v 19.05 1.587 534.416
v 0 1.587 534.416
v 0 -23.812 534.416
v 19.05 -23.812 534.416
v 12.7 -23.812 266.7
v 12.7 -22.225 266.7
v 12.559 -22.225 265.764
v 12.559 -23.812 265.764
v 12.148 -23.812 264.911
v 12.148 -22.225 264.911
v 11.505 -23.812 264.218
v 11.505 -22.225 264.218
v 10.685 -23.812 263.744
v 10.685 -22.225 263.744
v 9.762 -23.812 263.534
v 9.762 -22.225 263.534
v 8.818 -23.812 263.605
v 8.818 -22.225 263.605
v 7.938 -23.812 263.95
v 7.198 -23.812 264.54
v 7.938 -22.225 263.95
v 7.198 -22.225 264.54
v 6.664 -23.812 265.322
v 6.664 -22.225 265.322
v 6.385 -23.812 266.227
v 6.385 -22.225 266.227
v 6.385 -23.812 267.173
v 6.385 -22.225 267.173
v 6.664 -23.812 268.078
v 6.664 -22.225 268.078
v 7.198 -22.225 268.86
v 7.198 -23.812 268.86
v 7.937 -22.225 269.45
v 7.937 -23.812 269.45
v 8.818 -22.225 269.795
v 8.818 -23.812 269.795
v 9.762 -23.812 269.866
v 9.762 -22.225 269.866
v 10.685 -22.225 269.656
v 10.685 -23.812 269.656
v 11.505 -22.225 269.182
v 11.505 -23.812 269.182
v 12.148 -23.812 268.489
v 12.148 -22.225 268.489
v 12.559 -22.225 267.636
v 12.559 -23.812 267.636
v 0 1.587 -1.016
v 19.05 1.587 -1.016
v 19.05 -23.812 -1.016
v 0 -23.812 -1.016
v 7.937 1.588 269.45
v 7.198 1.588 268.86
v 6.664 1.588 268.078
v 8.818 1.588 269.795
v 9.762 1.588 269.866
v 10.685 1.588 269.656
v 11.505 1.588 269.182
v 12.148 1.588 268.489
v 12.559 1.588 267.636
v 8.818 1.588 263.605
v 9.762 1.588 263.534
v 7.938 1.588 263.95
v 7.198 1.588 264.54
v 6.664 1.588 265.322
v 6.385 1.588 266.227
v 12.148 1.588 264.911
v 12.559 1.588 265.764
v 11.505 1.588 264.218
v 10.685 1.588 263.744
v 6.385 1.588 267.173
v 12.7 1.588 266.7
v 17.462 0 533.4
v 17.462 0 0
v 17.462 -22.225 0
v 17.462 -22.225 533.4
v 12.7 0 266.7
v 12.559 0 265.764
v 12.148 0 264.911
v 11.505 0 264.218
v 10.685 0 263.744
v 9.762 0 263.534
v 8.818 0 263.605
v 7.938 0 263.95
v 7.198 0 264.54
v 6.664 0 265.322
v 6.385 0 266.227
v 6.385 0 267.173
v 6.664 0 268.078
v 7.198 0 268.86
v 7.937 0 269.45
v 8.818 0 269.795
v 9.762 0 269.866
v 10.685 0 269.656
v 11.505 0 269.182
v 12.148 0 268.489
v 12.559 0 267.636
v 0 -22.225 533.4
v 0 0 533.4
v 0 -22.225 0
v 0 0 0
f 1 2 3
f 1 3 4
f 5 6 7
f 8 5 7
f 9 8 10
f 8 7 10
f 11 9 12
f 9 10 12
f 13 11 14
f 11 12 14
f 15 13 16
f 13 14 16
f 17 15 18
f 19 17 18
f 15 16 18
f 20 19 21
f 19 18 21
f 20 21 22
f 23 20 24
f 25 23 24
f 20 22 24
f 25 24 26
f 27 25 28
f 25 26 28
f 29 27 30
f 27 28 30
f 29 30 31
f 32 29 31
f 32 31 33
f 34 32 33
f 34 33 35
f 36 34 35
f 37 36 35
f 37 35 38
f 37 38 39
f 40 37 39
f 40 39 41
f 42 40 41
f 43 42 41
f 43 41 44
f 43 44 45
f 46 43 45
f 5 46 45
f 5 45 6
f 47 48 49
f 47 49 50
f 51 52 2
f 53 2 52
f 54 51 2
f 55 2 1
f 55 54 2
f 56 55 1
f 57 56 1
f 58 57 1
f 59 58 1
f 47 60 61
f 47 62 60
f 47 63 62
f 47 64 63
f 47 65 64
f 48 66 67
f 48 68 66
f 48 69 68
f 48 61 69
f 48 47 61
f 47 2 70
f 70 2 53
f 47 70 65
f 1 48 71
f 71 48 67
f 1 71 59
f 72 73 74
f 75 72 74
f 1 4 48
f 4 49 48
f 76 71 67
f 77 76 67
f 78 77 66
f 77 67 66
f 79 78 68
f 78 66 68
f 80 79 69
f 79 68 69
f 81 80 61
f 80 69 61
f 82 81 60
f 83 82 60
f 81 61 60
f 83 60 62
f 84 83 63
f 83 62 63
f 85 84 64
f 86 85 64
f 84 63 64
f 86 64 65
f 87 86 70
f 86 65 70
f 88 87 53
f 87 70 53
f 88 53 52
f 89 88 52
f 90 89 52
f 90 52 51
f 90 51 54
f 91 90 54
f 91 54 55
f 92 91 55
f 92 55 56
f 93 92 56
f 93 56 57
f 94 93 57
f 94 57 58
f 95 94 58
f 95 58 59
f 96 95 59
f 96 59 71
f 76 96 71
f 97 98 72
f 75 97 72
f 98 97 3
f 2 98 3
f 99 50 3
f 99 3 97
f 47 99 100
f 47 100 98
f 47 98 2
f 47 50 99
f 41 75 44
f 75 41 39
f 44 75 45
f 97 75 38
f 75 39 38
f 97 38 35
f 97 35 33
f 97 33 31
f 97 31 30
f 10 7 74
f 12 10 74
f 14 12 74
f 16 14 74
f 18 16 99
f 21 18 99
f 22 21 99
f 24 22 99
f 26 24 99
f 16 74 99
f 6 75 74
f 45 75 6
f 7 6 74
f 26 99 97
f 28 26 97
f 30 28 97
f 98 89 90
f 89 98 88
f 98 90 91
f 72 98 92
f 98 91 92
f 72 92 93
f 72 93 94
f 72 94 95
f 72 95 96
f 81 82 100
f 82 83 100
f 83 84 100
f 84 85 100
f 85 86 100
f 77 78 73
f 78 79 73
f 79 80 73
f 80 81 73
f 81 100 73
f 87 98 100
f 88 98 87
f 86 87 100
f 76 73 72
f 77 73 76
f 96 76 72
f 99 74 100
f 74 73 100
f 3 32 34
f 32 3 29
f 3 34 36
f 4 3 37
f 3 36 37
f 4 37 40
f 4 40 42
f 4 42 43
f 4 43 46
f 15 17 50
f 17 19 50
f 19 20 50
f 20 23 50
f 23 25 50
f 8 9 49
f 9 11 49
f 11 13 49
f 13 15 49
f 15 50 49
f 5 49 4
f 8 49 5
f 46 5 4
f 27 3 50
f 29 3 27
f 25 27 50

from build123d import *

# Parameters (mm, degrees)
BOSS_EXTRUDE1_DEPTH = 533.4
SKETCH2_R           = 3.175
CUT_EXTRUDE1_DEPTH  = 381
SKETCH4_W           = 19.05
SKETCH4_H           = 25.4
BOSS_EXTRUDE3_DEPTH = 1.016
SKETCH5_W           = 19.05
SKETCH5_H           = 25.4
BOSS_EXTRUDE4_DEPTH = 1.016


with BuildPart() as part:
    # Sketch1 → Boss-Extrude1 (new body)
    with BuildSketch(Plane.XY):
        Polygon((0, 0), (17.4625, 0), (17.4625, -22.225), (0, -22.225), (0, -23.8125), (12.7, -23.8125), (19.05, -23.8125), (19.05, 0), (19.05, 1.5875), (0, 1.5875), align=None)
    extrude(amount=BOSS_EXTRUDE1_DEPTH)

    # Sketch2 → Cut-Extrude1 (cut)
    with BuildSketch(Plane(origin=(0, 1.5875, 0), x_dir=(1, 0, 0), z_dir=(0, 1, 0))):
        with Locations((9.525, -266.7)):
            Circle(SKETCH2_R)
    extrude(amount=-CUT_EXTRUDE1_DEPTH, mode=Mode.SUBTRACT)

    # Sketch4 → Boss-Extrude3 (add)
    with BuildSketch(Plane(origin=(0, 0, 0), x_dir=(-1, 0, 0), z_dir=(0, 0, -1))):
        with Locations((-9.525, -11.1125)):
            Rectangle(SKETCH4_W, SKETCH4_H)
    extrude(amount=BOSS_EXTRUDE3_DEPTH)

    # Sketch5 → Boss-Extrude4 (add)
    with BuildSketch(Plane.XY.offset(533.4)):
        with Locations((9.525, -11.1125)):
            Rectangle(SKETCH5_W, SKETCH5_H)
    extrude(amount=BOSS_EXTRUDE4_DEPTH)


solid = part.part
